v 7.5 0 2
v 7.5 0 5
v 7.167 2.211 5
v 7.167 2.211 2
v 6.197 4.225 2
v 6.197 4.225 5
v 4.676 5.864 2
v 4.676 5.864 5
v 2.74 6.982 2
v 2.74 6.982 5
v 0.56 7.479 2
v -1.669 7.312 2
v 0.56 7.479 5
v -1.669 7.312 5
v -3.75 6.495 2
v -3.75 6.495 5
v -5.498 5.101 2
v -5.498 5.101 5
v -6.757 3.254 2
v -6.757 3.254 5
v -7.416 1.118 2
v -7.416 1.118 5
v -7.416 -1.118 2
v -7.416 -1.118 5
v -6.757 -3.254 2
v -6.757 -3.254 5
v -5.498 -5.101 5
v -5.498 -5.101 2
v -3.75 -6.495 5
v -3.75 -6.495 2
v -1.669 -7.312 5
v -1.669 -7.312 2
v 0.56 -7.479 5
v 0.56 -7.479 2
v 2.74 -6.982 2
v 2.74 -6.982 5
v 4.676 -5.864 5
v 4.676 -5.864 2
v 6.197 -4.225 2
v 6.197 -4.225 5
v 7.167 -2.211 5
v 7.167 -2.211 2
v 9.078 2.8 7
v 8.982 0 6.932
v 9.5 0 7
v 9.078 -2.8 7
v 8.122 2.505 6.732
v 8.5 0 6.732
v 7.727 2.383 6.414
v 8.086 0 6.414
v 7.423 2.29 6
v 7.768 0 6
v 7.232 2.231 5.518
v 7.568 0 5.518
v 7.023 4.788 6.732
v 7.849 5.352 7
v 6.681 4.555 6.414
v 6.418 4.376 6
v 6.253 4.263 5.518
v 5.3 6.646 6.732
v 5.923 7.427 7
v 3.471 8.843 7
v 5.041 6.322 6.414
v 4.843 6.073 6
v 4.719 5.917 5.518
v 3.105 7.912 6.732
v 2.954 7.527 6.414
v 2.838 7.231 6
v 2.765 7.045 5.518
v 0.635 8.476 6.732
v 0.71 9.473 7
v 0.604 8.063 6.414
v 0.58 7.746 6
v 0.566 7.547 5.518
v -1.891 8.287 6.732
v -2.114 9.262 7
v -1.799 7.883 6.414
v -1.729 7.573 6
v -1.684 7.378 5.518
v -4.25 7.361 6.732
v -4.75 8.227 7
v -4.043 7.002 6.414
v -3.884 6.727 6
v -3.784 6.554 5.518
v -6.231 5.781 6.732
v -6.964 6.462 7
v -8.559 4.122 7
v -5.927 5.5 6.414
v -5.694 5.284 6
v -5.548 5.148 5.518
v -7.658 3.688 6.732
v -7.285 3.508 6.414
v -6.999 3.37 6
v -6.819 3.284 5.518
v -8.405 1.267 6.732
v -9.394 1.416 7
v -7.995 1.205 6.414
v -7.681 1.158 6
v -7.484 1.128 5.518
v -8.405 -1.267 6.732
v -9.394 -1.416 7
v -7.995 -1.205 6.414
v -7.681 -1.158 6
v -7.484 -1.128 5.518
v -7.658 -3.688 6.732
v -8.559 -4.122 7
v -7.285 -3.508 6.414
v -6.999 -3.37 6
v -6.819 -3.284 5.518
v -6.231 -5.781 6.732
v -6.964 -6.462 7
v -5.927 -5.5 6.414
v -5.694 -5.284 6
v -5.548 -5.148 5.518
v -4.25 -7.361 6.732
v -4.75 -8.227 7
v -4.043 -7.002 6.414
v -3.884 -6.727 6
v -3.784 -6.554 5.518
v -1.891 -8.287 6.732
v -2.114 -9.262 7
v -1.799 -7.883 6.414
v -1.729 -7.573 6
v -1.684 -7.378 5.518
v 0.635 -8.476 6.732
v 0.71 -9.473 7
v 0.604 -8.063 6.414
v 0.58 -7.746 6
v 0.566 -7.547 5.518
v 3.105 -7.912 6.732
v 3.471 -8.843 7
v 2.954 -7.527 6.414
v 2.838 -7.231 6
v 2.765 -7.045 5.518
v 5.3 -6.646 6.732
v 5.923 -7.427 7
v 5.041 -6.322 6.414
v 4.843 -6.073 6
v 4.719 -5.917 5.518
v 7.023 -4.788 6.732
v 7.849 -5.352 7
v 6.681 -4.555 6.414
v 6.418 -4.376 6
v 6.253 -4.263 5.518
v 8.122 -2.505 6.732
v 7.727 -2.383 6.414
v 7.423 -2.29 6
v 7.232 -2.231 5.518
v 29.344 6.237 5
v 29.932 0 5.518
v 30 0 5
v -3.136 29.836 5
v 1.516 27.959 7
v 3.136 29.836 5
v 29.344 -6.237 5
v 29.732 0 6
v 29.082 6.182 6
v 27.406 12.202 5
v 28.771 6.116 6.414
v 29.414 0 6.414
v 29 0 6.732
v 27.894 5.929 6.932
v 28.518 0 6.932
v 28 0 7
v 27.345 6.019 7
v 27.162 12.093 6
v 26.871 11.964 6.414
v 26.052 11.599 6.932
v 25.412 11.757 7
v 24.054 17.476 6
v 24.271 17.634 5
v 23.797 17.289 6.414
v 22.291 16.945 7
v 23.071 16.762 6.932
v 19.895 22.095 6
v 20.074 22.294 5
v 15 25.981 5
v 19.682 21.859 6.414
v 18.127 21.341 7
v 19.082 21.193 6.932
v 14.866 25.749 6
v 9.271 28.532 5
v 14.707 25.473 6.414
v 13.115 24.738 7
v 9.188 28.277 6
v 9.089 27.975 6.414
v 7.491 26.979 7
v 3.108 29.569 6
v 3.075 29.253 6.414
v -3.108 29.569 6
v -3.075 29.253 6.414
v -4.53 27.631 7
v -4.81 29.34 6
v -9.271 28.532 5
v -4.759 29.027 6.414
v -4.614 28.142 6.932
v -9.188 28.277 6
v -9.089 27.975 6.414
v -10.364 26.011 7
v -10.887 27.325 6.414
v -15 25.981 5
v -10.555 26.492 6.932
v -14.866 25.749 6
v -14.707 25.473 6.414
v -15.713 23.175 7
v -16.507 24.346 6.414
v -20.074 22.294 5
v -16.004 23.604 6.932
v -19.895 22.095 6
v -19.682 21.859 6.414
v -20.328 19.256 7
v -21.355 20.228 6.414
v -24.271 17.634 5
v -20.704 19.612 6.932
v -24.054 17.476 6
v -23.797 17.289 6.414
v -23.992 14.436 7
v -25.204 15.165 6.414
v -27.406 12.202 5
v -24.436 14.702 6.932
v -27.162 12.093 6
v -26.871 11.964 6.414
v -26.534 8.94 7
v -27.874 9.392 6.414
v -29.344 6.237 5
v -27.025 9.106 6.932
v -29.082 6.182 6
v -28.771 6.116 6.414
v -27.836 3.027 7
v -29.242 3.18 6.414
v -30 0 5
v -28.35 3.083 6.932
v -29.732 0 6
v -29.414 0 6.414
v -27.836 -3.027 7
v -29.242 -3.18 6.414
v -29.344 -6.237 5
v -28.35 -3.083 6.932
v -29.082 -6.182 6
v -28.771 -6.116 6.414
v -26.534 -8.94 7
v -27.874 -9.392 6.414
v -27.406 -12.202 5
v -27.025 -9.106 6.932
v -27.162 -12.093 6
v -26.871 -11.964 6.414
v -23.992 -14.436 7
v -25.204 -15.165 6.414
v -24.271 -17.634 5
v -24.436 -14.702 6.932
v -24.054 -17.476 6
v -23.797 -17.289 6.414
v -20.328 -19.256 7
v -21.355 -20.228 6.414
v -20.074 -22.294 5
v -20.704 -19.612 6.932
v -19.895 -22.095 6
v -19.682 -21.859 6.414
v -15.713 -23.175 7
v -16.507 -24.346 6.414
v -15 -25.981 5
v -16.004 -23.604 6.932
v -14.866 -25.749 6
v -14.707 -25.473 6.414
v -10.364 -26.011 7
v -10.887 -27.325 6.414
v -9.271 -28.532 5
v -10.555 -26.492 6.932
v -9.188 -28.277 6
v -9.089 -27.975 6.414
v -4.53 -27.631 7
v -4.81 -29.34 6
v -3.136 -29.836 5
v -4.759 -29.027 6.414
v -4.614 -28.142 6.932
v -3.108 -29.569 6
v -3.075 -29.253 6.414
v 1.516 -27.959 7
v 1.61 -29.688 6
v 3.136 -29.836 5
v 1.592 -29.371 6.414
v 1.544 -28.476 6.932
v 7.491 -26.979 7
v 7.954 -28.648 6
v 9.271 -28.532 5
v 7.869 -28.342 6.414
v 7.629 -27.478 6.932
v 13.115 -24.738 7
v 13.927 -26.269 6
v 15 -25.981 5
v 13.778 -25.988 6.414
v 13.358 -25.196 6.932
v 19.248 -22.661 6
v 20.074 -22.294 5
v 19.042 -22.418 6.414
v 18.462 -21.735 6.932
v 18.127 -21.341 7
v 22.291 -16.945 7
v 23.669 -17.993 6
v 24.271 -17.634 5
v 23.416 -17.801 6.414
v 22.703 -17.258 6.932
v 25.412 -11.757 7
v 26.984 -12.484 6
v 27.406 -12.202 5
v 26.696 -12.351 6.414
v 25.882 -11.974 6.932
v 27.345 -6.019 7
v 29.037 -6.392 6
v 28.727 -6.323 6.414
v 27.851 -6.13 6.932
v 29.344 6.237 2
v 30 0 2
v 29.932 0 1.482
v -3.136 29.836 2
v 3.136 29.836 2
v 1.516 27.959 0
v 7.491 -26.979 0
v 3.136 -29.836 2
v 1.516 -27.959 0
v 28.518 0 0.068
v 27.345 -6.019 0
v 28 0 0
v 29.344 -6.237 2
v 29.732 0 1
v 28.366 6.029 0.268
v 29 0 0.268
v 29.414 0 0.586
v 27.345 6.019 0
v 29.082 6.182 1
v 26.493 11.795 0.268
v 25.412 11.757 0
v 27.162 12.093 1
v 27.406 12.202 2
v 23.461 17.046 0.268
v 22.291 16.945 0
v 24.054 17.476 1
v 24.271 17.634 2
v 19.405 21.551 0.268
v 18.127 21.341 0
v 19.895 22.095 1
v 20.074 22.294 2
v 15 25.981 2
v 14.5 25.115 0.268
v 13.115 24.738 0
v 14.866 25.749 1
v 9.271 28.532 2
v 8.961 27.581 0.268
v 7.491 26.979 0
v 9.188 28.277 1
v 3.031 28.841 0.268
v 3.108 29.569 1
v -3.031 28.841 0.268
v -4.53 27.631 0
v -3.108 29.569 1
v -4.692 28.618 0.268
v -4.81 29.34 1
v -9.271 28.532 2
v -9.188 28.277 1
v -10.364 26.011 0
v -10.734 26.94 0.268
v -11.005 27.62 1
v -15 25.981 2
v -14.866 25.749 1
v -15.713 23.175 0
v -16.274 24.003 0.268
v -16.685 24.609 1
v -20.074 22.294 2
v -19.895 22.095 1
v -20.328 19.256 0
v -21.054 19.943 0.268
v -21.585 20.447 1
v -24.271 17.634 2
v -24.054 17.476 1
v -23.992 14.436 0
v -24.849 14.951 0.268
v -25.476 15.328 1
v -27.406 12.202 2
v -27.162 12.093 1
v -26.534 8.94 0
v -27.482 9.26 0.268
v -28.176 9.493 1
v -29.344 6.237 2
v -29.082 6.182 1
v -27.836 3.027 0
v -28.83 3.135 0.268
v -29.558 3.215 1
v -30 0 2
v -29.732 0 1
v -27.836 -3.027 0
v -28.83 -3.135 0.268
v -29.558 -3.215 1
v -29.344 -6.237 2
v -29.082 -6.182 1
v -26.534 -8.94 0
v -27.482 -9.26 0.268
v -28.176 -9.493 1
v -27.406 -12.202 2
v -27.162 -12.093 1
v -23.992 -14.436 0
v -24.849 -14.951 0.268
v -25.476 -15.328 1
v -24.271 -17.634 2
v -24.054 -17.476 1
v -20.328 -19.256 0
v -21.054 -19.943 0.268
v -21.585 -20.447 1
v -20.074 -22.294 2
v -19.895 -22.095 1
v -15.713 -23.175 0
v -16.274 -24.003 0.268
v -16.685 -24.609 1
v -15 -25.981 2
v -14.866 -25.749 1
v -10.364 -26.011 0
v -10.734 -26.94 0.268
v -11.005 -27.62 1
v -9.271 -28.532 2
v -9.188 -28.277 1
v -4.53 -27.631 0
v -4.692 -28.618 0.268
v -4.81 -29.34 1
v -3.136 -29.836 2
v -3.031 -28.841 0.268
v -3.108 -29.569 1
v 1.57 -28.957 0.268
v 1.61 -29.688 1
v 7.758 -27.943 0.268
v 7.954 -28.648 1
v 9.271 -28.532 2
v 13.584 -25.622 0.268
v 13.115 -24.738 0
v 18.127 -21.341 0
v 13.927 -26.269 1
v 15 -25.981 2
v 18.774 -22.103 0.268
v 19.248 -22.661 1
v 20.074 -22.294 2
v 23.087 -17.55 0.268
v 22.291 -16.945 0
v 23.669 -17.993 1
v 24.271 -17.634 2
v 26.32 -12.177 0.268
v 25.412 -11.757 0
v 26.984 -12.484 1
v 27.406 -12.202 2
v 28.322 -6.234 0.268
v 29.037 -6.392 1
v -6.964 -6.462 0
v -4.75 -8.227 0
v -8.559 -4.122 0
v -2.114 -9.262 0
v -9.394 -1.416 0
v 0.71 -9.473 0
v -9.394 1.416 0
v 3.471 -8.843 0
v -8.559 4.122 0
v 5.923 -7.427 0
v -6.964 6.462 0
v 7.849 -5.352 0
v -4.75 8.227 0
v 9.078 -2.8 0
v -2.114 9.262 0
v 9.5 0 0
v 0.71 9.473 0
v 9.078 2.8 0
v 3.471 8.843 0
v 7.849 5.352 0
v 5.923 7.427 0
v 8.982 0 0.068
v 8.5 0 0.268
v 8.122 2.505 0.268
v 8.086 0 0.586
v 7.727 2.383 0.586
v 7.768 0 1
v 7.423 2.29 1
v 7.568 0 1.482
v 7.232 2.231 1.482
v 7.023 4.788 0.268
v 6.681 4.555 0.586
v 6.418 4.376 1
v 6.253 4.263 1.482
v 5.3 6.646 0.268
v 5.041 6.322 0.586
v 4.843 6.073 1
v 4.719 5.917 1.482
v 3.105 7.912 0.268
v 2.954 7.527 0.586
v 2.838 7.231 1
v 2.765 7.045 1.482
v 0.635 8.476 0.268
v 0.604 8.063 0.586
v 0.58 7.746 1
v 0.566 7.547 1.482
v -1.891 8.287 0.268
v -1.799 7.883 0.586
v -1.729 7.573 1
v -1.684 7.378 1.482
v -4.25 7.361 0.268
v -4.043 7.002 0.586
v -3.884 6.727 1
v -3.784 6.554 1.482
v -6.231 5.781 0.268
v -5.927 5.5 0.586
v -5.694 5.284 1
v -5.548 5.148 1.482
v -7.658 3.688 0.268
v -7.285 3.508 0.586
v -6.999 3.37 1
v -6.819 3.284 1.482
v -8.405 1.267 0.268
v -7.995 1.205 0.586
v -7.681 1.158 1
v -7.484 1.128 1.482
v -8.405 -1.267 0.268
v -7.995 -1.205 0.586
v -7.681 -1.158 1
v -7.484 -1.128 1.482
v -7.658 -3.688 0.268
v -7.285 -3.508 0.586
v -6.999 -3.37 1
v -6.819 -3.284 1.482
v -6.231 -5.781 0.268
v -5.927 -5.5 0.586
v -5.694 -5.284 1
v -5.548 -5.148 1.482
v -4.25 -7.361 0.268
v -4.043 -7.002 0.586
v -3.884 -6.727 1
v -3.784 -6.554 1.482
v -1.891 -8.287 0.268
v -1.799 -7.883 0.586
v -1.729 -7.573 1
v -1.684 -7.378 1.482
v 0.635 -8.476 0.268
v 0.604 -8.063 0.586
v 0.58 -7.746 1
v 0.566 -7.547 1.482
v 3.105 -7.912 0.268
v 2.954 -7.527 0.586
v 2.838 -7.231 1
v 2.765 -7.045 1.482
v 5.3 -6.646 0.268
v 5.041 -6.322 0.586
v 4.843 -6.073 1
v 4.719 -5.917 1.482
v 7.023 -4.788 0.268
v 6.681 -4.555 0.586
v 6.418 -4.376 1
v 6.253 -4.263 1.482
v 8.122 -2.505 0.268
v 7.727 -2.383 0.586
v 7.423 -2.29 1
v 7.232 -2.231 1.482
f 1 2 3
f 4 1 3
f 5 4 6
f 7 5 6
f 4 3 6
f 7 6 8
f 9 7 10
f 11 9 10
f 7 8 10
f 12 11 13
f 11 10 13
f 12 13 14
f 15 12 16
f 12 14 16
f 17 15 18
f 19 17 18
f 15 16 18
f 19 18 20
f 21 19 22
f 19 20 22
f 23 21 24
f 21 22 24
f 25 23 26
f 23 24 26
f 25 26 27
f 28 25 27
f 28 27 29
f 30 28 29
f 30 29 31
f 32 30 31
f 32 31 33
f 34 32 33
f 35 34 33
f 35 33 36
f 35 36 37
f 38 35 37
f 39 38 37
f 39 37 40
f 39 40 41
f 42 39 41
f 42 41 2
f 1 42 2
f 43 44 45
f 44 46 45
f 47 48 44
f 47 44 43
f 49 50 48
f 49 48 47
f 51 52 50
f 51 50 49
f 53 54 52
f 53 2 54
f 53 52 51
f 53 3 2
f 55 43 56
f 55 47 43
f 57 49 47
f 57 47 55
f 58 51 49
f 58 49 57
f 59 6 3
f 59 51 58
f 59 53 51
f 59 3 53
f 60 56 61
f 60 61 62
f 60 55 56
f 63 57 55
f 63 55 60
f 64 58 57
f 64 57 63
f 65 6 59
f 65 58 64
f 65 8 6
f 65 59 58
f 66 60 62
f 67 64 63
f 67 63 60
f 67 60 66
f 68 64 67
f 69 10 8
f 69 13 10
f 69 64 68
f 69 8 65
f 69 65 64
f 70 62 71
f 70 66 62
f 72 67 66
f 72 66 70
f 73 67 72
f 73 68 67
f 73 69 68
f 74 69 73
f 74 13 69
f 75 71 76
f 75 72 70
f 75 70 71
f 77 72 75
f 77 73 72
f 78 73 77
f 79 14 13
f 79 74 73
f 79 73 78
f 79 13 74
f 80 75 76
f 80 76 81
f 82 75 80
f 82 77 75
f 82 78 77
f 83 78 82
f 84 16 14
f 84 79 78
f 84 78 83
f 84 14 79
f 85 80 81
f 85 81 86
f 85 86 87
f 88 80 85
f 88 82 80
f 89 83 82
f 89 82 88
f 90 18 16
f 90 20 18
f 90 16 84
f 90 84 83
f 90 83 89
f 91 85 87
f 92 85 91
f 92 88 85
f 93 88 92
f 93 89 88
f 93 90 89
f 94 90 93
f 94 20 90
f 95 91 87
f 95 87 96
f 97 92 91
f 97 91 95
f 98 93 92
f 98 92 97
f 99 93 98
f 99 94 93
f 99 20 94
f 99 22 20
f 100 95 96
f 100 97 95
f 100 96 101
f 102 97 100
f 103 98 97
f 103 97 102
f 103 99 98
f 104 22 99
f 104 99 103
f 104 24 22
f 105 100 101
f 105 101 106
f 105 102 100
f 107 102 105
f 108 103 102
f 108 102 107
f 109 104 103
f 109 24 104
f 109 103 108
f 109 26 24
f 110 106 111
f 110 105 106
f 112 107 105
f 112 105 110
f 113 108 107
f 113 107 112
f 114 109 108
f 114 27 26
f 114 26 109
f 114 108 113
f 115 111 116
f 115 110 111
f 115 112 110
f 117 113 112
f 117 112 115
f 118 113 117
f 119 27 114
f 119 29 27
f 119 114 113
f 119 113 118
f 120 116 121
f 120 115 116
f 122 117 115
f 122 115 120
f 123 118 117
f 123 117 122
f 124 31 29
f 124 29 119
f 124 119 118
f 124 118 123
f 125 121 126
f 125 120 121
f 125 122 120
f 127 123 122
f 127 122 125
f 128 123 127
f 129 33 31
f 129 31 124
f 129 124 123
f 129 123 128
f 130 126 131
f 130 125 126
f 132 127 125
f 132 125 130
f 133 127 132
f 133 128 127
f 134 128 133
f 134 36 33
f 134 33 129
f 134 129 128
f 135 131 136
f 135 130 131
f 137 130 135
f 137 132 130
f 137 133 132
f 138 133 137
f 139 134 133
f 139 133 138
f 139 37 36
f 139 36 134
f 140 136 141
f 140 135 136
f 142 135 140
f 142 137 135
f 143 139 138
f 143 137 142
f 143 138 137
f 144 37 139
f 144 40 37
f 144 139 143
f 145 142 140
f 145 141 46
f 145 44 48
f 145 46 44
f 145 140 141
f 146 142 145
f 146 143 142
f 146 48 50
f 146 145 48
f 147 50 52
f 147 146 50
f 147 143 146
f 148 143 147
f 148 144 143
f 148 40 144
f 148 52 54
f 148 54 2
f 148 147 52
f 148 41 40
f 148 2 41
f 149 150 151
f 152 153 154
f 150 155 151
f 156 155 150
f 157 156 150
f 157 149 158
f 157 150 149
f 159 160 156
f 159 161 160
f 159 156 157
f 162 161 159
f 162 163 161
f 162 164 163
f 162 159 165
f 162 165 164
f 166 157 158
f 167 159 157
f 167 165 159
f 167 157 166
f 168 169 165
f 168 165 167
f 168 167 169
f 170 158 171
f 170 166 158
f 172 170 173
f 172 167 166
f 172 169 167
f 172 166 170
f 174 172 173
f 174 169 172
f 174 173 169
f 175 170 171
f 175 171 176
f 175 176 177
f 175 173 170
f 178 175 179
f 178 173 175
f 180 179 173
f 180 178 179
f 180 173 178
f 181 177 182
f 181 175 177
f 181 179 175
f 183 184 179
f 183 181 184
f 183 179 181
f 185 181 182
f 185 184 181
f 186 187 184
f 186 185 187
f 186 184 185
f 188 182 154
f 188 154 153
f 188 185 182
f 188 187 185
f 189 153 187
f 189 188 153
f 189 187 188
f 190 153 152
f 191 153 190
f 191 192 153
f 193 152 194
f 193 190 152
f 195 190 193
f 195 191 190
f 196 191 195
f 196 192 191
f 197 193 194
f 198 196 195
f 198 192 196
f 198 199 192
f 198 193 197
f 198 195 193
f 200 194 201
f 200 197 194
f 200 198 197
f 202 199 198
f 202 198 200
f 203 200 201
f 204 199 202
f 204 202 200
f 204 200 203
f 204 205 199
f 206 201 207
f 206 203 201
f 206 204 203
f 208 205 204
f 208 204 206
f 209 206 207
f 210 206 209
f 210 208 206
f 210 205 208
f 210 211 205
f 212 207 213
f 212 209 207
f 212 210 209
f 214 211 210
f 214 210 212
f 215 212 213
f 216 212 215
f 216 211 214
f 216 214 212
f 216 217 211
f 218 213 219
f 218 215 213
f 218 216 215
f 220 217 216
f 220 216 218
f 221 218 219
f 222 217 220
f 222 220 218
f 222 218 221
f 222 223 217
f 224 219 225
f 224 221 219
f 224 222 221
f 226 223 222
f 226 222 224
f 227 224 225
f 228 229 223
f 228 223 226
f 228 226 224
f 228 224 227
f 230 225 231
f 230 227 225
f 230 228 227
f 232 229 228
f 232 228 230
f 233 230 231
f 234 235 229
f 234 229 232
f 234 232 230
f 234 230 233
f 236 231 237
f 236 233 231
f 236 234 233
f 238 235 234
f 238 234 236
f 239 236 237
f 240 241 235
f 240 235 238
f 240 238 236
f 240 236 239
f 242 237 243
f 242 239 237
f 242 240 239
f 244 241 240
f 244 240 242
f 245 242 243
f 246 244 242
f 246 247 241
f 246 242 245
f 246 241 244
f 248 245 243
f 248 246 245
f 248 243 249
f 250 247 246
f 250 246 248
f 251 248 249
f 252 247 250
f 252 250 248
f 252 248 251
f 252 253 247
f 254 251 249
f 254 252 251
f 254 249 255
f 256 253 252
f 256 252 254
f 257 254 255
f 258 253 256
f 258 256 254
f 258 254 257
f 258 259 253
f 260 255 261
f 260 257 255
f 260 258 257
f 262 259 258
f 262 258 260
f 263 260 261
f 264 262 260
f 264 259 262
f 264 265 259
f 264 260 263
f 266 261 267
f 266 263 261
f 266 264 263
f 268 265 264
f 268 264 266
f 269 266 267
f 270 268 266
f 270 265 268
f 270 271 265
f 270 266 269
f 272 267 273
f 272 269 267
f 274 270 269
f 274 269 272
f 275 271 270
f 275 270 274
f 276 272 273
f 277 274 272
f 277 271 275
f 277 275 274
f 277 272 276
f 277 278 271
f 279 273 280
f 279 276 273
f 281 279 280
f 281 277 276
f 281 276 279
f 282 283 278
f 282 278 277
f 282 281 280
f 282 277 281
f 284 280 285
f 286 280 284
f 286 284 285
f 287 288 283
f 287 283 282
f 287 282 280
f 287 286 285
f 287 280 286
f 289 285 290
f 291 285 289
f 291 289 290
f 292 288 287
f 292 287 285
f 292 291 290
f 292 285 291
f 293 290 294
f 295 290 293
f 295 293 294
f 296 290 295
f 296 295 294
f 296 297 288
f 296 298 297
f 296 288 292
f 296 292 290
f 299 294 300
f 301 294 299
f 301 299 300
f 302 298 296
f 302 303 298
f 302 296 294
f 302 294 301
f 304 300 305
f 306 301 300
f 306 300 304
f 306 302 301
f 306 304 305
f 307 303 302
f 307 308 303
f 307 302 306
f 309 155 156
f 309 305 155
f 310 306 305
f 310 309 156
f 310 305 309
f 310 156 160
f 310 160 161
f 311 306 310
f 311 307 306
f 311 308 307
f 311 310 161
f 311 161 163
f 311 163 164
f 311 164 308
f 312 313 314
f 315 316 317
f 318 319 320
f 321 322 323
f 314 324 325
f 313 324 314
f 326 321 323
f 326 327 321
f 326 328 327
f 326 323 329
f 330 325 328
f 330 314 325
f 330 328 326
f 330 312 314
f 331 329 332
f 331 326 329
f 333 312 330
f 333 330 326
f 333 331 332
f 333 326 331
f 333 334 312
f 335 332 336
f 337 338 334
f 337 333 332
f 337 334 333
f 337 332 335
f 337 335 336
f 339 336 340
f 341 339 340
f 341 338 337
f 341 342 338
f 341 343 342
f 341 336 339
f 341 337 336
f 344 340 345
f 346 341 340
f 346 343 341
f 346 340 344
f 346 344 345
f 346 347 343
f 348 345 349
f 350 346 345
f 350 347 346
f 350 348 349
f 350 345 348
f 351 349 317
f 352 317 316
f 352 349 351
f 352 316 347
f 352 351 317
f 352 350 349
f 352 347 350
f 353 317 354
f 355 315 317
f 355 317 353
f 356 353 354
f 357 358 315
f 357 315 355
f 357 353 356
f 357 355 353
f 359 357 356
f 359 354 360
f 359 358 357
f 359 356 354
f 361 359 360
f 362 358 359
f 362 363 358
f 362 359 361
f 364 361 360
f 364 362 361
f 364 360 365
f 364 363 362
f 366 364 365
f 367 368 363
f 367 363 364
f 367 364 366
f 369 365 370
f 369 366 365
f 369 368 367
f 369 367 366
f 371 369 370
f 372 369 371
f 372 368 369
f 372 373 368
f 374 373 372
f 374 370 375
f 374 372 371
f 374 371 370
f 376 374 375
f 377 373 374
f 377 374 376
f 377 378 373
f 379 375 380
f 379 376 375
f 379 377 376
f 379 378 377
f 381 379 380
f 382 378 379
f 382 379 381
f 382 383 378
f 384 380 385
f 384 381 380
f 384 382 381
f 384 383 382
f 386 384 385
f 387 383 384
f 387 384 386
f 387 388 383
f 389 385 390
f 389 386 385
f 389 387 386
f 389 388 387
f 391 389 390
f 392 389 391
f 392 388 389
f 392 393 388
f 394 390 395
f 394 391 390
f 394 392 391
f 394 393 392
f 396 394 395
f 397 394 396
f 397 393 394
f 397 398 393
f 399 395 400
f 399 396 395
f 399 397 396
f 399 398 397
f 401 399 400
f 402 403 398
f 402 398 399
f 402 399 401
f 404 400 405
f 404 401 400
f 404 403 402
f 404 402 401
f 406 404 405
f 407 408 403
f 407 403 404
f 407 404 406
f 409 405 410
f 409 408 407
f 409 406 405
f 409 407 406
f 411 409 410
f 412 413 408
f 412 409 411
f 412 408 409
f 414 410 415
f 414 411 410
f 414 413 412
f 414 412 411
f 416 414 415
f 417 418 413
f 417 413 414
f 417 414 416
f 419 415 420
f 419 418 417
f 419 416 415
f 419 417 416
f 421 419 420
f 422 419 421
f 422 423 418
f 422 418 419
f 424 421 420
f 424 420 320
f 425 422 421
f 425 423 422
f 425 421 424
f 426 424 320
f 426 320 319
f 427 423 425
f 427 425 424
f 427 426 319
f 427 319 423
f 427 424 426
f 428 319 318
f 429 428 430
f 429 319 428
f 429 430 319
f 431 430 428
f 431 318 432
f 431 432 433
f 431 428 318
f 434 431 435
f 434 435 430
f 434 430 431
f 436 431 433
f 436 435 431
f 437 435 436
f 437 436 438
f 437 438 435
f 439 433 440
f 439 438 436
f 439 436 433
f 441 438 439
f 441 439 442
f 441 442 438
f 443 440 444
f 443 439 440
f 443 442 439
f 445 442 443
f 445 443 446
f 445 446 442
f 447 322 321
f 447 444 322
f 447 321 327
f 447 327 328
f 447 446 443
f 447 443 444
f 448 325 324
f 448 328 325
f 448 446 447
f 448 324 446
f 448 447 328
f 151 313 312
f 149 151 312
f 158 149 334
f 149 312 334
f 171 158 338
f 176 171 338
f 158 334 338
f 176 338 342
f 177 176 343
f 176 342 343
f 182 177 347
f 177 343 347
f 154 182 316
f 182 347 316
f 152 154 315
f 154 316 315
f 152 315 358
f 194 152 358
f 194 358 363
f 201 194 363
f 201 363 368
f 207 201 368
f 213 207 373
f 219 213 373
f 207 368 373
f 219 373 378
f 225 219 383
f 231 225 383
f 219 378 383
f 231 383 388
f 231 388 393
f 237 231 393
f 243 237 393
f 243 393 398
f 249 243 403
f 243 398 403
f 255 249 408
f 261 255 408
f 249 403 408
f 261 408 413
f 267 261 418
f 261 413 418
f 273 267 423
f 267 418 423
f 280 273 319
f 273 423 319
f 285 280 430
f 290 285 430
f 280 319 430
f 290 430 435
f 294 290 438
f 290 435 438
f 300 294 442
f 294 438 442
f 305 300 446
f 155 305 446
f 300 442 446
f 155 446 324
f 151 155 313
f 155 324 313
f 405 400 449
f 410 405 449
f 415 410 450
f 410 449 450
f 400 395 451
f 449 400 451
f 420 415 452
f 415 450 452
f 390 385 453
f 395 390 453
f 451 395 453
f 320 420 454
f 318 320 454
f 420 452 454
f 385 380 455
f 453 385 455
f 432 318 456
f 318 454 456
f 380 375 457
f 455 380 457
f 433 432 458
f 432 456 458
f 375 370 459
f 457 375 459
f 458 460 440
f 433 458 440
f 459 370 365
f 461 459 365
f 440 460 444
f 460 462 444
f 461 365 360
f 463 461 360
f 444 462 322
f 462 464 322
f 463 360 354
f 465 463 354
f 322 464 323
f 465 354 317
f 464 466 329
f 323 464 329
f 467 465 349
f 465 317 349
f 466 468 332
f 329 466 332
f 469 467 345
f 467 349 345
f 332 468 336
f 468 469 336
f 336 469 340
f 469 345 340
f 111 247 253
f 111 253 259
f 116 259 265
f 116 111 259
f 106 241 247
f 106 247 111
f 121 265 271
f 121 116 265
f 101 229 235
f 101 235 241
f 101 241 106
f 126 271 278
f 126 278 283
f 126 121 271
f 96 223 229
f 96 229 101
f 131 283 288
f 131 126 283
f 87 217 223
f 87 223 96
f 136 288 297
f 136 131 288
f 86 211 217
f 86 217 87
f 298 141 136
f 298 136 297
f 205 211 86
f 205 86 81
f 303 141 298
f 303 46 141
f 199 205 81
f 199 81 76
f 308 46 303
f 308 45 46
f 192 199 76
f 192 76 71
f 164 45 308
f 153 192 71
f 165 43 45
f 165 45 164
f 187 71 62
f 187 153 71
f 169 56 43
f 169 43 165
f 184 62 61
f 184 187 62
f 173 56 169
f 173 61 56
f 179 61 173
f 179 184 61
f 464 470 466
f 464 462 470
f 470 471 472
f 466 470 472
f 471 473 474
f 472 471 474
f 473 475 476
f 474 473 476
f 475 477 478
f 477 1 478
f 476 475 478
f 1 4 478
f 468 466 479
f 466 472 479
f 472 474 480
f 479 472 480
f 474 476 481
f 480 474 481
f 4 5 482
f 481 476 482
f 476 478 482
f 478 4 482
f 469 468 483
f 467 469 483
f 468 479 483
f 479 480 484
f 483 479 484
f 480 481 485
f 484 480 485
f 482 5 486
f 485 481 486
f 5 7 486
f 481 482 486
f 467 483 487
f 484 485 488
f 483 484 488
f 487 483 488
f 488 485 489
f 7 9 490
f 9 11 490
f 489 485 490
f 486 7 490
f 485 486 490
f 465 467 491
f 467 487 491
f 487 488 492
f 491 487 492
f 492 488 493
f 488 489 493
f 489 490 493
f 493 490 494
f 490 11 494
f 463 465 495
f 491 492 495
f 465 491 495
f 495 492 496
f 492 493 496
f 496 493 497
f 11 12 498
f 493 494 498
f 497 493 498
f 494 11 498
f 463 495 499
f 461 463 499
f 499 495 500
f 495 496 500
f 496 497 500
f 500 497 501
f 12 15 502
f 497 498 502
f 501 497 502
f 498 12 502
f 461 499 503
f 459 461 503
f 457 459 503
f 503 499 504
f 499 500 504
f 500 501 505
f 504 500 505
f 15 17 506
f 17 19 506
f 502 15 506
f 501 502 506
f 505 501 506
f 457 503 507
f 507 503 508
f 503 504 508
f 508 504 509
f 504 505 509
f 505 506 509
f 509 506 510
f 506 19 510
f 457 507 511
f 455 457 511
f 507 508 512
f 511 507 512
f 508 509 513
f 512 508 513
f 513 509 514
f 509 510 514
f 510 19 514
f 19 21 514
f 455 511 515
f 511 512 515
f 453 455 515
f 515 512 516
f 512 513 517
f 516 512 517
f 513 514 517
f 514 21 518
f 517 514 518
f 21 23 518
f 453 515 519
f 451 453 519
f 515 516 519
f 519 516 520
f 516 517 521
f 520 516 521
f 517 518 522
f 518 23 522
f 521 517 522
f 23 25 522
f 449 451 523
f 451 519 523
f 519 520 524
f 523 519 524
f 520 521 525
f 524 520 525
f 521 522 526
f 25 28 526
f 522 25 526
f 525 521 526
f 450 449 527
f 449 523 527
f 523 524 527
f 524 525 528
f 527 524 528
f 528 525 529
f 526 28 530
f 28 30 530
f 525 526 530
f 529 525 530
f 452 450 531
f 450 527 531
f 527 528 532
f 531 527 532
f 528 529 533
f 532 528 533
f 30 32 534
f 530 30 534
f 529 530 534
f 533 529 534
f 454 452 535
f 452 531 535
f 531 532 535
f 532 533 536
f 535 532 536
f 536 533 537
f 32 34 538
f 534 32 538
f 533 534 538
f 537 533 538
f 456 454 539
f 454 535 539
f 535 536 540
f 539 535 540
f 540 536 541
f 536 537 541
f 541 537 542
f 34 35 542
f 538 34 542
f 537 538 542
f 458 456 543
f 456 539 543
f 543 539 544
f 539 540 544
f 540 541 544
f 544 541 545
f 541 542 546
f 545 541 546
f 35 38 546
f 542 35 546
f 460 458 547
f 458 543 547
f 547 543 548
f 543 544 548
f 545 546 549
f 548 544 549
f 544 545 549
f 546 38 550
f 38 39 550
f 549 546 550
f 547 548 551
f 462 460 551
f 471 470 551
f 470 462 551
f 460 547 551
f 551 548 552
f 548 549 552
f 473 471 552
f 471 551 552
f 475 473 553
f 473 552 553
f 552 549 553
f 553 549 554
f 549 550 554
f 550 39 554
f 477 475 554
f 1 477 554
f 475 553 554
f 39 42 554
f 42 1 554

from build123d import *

# Parameters (mm, degrees)
F0_R     = 30
F1_DEPTH = 7
F3_R     = 7.5
F4_DEPTH = 25
F5_R     = 2
F6_R     = 2


with BuildPart() as f1:
    # F0 (on Top) → F1 (new body)
    with BuildSketch(Plane.XY):
        Circle(F0_R)
    extrude(amount=F1_DEPTH)

    # F3 (on face) → F4 (cut)
    with BuildSketch(Plane.XY.offset(7)):
        Circle(F3_R)
    extrude(amount=-F4_DEPTH, mode=Mode.SUBTRACT)

    # F5
    f5_edges = [f1.edges().sort_by_distance(p)[0] for p in [
        (-7.5, 0, 7),
        (-7.5, 0, 0),
    ]]
    fillet(f5_edges, radius=F5_R)

    # F6
    f6_edges = [f1.edges().sort_by_distance(p)[0] for p in [
        (-30, 0, 7),
        (-30, 0, 0),
    ]]
    fillet(f6_edges, radius=F6_R)


solid = f1.part
